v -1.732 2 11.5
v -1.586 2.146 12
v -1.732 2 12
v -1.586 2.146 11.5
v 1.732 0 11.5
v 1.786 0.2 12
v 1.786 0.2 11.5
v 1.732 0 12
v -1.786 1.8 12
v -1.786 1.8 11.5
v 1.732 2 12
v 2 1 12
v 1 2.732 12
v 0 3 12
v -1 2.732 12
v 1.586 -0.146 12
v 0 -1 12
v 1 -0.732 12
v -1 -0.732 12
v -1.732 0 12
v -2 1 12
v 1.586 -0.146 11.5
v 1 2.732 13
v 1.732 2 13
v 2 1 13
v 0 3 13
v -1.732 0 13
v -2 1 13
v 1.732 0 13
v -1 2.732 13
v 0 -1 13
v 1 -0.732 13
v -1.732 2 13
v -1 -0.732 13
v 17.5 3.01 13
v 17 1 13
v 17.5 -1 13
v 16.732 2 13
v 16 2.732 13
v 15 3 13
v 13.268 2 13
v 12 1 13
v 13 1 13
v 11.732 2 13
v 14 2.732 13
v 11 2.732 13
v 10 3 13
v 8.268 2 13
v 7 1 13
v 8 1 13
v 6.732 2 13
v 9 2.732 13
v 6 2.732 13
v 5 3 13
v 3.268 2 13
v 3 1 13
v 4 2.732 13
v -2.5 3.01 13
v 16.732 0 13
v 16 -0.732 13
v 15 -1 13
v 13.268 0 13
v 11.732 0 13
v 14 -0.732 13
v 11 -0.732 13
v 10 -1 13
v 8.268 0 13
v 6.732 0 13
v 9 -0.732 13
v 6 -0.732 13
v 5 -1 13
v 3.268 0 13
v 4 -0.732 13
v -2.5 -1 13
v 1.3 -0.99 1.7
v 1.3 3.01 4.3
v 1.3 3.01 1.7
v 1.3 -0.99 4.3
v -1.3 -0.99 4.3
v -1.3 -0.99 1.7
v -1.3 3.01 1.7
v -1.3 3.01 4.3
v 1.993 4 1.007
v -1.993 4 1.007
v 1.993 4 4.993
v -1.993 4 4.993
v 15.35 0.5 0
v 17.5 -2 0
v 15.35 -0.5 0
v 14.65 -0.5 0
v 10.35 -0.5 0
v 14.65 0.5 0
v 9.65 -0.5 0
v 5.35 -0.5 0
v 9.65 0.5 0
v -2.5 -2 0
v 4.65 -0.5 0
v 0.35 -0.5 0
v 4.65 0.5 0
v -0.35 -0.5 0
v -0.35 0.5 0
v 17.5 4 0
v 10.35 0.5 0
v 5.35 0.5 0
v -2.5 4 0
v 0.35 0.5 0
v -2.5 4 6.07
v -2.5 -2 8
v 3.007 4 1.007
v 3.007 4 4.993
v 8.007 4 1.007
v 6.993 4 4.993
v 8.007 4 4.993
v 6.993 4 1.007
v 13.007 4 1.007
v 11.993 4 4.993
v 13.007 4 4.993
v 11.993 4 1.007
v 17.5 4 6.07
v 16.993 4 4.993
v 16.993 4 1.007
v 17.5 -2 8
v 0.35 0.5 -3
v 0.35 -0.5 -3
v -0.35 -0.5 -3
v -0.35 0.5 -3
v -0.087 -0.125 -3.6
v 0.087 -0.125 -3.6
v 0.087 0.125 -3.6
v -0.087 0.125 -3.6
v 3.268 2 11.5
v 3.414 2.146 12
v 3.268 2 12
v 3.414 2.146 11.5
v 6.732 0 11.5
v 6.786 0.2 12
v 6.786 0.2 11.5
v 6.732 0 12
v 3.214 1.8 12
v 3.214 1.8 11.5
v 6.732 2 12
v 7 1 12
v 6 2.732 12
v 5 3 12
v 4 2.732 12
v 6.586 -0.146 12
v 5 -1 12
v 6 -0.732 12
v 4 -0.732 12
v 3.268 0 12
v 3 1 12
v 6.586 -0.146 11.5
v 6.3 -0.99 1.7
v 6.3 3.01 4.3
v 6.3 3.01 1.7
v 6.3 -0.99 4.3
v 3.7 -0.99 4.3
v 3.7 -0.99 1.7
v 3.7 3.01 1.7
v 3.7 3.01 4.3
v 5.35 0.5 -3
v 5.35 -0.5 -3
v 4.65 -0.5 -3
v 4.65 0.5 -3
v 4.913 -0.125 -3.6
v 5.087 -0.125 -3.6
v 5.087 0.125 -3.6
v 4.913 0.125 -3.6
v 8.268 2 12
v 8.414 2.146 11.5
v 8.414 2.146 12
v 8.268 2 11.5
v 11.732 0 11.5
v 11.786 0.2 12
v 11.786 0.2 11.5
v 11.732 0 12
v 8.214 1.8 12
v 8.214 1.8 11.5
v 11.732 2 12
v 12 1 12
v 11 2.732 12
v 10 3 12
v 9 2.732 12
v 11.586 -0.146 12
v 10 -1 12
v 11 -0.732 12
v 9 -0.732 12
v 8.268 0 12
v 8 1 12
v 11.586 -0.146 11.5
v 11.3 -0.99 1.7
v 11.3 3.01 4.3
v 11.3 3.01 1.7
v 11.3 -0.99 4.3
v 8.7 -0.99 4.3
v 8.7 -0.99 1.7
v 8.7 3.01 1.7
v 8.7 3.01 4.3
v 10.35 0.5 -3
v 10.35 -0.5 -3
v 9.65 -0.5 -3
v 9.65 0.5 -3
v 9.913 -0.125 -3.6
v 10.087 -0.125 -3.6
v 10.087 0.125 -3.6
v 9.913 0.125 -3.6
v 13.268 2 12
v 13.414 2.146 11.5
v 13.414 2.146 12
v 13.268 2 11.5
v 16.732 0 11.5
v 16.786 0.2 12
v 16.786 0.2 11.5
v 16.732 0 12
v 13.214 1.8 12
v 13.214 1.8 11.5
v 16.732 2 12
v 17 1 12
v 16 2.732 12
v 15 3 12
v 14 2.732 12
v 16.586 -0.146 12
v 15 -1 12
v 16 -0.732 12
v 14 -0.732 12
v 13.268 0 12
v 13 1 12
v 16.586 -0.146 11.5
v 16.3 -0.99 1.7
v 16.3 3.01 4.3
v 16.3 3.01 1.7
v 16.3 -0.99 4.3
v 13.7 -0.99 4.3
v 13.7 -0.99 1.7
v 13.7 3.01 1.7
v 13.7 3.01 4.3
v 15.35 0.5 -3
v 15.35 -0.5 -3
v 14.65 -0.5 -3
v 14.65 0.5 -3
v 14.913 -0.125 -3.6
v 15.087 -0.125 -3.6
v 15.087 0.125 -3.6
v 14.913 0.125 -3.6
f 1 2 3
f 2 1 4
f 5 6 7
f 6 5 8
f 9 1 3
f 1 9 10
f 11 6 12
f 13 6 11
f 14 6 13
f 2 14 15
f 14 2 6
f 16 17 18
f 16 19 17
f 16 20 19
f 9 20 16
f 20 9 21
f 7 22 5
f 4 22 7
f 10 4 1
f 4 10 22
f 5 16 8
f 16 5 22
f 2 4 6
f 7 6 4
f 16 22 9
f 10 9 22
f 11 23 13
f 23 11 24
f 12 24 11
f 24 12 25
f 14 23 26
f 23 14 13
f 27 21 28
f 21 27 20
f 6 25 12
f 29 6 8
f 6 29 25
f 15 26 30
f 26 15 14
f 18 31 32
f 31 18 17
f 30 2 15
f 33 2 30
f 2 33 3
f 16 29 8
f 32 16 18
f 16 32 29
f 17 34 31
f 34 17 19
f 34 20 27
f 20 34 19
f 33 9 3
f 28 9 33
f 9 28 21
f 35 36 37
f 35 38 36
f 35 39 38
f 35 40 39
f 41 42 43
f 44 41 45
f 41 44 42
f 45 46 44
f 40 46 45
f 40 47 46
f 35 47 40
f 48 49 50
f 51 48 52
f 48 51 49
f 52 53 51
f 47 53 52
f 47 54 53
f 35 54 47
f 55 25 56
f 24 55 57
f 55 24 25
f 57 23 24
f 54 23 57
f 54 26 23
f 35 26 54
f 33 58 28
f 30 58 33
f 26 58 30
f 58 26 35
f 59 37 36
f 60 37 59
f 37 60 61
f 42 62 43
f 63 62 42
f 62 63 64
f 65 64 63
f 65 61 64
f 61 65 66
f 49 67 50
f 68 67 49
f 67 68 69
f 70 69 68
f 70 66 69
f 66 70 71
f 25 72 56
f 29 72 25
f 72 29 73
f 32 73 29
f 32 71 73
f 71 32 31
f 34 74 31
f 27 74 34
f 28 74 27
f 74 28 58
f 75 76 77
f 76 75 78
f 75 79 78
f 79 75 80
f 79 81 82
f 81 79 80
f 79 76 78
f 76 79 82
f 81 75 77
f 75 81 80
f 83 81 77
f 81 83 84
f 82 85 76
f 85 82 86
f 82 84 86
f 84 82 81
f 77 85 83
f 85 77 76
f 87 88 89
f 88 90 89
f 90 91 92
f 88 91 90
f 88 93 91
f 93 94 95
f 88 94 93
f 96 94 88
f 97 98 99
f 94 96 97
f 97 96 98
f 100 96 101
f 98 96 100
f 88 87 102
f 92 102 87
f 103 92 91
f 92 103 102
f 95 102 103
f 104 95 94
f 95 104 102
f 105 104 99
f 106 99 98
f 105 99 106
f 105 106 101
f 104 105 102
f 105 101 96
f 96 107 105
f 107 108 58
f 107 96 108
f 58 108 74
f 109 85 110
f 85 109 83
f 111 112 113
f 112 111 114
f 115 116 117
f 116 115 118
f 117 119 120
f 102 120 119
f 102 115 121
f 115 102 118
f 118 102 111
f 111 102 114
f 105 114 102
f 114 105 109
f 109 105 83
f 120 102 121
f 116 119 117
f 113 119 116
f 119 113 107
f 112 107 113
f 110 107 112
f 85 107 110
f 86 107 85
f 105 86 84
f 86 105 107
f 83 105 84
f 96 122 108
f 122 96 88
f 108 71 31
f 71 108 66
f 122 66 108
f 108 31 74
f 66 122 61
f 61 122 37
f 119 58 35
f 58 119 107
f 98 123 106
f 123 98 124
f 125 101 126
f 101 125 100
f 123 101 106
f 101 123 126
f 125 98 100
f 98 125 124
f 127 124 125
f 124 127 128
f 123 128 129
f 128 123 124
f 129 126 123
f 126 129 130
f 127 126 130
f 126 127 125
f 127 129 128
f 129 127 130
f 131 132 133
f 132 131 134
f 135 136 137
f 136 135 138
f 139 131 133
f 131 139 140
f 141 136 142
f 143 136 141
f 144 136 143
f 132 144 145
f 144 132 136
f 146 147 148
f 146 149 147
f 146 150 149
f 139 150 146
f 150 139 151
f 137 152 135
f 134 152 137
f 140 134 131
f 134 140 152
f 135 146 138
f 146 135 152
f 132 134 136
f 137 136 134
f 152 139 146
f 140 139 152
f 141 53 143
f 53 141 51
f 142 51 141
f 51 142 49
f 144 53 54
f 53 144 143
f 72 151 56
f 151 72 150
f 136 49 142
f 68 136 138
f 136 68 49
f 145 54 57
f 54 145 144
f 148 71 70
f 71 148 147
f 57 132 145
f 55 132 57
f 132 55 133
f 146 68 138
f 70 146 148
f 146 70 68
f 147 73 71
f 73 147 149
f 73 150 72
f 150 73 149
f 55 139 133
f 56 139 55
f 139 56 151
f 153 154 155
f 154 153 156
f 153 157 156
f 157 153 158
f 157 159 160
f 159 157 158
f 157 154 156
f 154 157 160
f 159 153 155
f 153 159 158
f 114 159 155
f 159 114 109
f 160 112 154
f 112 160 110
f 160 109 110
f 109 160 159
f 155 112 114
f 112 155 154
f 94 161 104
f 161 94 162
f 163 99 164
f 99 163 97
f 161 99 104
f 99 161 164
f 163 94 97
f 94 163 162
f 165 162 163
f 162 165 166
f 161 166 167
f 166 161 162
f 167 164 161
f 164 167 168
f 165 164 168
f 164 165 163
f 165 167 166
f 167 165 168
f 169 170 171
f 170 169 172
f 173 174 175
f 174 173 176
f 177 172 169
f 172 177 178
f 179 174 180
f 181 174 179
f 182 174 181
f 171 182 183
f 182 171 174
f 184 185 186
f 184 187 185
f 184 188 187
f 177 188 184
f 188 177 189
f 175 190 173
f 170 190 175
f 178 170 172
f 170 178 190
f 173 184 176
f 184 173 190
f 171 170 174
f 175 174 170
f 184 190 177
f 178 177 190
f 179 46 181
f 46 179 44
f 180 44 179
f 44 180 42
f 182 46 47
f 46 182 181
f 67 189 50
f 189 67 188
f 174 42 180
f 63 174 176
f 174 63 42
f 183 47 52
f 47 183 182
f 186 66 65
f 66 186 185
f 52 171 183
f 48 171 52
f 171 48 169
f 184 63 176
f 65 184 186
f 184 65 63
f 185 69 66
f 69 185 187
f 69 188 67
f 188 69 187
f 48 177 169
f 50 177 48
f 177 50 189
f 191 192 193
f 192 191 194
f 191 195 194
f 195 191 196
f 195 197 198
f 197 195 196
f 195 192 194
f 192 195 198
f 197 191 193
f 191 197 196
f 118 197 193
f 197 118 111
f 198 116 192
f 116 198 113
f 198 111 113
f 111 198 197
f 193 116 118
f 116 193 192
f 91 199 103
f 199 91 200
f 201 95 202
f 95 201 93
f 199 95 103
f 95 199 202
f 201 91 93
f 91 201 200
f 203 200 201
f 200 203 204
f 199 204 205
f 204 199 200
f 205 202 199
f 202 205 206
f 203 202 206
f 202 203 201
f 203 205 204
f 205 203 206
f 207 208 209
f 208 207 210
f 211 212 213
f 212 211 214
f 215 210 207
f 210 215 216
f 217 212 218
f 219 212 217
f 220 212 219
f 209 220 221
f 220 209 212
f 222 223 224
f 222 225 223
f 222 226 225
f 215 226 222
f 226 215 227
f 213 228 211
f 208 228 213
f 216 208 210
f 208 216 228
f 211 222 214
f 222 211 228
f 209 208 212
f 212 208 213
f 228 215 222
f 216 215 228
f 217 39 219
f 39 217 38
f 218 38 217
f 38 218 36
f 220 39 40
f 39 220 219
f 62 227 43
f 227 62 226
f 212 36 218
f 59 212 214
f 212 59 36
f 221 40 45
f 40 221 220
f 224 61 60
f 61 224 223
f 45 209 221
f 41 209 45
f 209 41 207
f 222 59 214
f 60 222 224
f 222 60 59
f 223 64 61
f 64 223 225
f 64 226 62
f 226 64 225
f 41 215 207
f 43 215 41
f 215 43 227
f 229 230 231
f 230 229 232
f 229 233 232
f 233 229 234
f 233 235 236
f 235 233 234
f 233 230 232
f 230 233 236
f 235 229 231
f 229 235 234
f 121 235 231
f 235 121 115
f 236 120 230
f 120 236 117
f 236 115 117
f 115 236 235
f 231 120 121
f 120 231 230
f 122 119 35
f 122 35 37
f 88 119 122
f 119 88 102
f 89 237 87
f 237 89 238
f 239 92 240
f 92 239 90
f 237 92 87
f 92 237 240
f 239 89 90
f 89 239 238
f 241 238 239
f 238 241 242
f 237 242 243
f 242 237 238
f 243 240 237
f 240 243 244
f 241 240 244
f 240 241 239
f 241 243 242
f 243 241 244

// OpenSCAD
module wedge(x,y,z){
    translate([0,y/2,z/2]) resize([x,y,z]){
        rotate([0,90,0]) translate([0,0,-0.5]) linear_extrude(1){
            polygon([[-0.5,0.5],[-0.5,-0.5],[0.5,-0.5]],1);
        }
    }
}

module terminal(){
    translate([0,1,0]){
        difference(){
            translate([0,0,6.5]) cube([5,6,13],true);
            translate([0,-3,8]) resize([6,0,0],true){
                wedge(5,1,5);
            }
            translate([0,3.01,6]) rotate([0,0,180]) resize([6,0,0],true){
                wedge(5,1,7);
            }
            translate([0,0,12]){
                cylinder(1,2,2,$fn=12);
                translate([0,0,-0.5]) rotate([0,0,60]){
                    intersection() {
                        cylinder(0.5,2,2,$fn=12);
                        translate([-0.2,-2,0]) cube([0.4,4,0.5]);
                    }
                }
            }
            translate([0,3.01,3]) rotate([90,0,0]){
                translate([0,0,3]) cube([2.6,2.6,4],true);
                resize([4,4,0]) rotate([0,0,45]) cylinder(1,4,2.6,$fn=4);
            }
        }
    }
    translate([0,0,-3]) {
        translate([-0.35,-0.5,0]) cube([0.7,1,3]);
        translate([0,0,-0.6]) resize([0.7,1,0.6]) rotate([0,0,45]){
            cylinder(1,0.25,1,$fn=4);
        }
    }
}

render(10){
    for(x=[0:5:15]){
        translate([x,0,0]) terminal();
    }
}
